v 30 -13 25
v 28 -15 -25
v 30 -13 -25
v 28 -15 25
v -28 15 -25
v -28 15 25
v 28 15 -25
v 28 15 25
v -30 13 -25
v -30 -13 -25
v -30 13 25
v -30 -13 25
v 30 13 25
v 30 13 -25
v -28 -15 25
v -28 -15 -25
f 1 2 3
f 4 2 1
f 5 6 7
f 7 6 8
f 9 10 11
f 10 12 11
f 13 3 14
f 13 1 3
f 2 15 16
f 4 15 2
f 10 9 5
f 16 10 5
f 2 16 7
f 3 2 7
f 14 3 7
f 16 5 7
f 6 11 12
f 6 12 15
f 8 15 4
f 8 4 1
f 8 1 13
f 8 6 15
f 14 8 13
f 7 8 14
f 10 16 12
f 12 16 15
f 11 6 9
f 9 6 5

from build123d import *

# Parameters (mm, degrees)
SKETCH_1_W      = 60
SKETCH_1_H      = 30
EXTRUDE_1_DEPTH = 25
CHAMFER_1_SIZE  = 2


with BuildPart() as part:
    # 草图1 → 凸台-拉伸1 (new, symmetric)
    with BuildSketch(Plane.XY):
        Rectangle(SKETCH_1_W, SKETCH_1_H)
    extrude(amount=EXTRUDE_1_DEPTH, both=True)

    # 倒角1
    chamfer_1_edges = [part.edges().sort_by_distance(p)[0] for p in [
        (30, -15, 0),
        (-30, -15, 0),
        (-30, 15, 0),
        (30, 15, 0),
    ]]
    chamfer(chamfer_1_edges, length=CHAMFER_1_SIZE)


solid = part.part
